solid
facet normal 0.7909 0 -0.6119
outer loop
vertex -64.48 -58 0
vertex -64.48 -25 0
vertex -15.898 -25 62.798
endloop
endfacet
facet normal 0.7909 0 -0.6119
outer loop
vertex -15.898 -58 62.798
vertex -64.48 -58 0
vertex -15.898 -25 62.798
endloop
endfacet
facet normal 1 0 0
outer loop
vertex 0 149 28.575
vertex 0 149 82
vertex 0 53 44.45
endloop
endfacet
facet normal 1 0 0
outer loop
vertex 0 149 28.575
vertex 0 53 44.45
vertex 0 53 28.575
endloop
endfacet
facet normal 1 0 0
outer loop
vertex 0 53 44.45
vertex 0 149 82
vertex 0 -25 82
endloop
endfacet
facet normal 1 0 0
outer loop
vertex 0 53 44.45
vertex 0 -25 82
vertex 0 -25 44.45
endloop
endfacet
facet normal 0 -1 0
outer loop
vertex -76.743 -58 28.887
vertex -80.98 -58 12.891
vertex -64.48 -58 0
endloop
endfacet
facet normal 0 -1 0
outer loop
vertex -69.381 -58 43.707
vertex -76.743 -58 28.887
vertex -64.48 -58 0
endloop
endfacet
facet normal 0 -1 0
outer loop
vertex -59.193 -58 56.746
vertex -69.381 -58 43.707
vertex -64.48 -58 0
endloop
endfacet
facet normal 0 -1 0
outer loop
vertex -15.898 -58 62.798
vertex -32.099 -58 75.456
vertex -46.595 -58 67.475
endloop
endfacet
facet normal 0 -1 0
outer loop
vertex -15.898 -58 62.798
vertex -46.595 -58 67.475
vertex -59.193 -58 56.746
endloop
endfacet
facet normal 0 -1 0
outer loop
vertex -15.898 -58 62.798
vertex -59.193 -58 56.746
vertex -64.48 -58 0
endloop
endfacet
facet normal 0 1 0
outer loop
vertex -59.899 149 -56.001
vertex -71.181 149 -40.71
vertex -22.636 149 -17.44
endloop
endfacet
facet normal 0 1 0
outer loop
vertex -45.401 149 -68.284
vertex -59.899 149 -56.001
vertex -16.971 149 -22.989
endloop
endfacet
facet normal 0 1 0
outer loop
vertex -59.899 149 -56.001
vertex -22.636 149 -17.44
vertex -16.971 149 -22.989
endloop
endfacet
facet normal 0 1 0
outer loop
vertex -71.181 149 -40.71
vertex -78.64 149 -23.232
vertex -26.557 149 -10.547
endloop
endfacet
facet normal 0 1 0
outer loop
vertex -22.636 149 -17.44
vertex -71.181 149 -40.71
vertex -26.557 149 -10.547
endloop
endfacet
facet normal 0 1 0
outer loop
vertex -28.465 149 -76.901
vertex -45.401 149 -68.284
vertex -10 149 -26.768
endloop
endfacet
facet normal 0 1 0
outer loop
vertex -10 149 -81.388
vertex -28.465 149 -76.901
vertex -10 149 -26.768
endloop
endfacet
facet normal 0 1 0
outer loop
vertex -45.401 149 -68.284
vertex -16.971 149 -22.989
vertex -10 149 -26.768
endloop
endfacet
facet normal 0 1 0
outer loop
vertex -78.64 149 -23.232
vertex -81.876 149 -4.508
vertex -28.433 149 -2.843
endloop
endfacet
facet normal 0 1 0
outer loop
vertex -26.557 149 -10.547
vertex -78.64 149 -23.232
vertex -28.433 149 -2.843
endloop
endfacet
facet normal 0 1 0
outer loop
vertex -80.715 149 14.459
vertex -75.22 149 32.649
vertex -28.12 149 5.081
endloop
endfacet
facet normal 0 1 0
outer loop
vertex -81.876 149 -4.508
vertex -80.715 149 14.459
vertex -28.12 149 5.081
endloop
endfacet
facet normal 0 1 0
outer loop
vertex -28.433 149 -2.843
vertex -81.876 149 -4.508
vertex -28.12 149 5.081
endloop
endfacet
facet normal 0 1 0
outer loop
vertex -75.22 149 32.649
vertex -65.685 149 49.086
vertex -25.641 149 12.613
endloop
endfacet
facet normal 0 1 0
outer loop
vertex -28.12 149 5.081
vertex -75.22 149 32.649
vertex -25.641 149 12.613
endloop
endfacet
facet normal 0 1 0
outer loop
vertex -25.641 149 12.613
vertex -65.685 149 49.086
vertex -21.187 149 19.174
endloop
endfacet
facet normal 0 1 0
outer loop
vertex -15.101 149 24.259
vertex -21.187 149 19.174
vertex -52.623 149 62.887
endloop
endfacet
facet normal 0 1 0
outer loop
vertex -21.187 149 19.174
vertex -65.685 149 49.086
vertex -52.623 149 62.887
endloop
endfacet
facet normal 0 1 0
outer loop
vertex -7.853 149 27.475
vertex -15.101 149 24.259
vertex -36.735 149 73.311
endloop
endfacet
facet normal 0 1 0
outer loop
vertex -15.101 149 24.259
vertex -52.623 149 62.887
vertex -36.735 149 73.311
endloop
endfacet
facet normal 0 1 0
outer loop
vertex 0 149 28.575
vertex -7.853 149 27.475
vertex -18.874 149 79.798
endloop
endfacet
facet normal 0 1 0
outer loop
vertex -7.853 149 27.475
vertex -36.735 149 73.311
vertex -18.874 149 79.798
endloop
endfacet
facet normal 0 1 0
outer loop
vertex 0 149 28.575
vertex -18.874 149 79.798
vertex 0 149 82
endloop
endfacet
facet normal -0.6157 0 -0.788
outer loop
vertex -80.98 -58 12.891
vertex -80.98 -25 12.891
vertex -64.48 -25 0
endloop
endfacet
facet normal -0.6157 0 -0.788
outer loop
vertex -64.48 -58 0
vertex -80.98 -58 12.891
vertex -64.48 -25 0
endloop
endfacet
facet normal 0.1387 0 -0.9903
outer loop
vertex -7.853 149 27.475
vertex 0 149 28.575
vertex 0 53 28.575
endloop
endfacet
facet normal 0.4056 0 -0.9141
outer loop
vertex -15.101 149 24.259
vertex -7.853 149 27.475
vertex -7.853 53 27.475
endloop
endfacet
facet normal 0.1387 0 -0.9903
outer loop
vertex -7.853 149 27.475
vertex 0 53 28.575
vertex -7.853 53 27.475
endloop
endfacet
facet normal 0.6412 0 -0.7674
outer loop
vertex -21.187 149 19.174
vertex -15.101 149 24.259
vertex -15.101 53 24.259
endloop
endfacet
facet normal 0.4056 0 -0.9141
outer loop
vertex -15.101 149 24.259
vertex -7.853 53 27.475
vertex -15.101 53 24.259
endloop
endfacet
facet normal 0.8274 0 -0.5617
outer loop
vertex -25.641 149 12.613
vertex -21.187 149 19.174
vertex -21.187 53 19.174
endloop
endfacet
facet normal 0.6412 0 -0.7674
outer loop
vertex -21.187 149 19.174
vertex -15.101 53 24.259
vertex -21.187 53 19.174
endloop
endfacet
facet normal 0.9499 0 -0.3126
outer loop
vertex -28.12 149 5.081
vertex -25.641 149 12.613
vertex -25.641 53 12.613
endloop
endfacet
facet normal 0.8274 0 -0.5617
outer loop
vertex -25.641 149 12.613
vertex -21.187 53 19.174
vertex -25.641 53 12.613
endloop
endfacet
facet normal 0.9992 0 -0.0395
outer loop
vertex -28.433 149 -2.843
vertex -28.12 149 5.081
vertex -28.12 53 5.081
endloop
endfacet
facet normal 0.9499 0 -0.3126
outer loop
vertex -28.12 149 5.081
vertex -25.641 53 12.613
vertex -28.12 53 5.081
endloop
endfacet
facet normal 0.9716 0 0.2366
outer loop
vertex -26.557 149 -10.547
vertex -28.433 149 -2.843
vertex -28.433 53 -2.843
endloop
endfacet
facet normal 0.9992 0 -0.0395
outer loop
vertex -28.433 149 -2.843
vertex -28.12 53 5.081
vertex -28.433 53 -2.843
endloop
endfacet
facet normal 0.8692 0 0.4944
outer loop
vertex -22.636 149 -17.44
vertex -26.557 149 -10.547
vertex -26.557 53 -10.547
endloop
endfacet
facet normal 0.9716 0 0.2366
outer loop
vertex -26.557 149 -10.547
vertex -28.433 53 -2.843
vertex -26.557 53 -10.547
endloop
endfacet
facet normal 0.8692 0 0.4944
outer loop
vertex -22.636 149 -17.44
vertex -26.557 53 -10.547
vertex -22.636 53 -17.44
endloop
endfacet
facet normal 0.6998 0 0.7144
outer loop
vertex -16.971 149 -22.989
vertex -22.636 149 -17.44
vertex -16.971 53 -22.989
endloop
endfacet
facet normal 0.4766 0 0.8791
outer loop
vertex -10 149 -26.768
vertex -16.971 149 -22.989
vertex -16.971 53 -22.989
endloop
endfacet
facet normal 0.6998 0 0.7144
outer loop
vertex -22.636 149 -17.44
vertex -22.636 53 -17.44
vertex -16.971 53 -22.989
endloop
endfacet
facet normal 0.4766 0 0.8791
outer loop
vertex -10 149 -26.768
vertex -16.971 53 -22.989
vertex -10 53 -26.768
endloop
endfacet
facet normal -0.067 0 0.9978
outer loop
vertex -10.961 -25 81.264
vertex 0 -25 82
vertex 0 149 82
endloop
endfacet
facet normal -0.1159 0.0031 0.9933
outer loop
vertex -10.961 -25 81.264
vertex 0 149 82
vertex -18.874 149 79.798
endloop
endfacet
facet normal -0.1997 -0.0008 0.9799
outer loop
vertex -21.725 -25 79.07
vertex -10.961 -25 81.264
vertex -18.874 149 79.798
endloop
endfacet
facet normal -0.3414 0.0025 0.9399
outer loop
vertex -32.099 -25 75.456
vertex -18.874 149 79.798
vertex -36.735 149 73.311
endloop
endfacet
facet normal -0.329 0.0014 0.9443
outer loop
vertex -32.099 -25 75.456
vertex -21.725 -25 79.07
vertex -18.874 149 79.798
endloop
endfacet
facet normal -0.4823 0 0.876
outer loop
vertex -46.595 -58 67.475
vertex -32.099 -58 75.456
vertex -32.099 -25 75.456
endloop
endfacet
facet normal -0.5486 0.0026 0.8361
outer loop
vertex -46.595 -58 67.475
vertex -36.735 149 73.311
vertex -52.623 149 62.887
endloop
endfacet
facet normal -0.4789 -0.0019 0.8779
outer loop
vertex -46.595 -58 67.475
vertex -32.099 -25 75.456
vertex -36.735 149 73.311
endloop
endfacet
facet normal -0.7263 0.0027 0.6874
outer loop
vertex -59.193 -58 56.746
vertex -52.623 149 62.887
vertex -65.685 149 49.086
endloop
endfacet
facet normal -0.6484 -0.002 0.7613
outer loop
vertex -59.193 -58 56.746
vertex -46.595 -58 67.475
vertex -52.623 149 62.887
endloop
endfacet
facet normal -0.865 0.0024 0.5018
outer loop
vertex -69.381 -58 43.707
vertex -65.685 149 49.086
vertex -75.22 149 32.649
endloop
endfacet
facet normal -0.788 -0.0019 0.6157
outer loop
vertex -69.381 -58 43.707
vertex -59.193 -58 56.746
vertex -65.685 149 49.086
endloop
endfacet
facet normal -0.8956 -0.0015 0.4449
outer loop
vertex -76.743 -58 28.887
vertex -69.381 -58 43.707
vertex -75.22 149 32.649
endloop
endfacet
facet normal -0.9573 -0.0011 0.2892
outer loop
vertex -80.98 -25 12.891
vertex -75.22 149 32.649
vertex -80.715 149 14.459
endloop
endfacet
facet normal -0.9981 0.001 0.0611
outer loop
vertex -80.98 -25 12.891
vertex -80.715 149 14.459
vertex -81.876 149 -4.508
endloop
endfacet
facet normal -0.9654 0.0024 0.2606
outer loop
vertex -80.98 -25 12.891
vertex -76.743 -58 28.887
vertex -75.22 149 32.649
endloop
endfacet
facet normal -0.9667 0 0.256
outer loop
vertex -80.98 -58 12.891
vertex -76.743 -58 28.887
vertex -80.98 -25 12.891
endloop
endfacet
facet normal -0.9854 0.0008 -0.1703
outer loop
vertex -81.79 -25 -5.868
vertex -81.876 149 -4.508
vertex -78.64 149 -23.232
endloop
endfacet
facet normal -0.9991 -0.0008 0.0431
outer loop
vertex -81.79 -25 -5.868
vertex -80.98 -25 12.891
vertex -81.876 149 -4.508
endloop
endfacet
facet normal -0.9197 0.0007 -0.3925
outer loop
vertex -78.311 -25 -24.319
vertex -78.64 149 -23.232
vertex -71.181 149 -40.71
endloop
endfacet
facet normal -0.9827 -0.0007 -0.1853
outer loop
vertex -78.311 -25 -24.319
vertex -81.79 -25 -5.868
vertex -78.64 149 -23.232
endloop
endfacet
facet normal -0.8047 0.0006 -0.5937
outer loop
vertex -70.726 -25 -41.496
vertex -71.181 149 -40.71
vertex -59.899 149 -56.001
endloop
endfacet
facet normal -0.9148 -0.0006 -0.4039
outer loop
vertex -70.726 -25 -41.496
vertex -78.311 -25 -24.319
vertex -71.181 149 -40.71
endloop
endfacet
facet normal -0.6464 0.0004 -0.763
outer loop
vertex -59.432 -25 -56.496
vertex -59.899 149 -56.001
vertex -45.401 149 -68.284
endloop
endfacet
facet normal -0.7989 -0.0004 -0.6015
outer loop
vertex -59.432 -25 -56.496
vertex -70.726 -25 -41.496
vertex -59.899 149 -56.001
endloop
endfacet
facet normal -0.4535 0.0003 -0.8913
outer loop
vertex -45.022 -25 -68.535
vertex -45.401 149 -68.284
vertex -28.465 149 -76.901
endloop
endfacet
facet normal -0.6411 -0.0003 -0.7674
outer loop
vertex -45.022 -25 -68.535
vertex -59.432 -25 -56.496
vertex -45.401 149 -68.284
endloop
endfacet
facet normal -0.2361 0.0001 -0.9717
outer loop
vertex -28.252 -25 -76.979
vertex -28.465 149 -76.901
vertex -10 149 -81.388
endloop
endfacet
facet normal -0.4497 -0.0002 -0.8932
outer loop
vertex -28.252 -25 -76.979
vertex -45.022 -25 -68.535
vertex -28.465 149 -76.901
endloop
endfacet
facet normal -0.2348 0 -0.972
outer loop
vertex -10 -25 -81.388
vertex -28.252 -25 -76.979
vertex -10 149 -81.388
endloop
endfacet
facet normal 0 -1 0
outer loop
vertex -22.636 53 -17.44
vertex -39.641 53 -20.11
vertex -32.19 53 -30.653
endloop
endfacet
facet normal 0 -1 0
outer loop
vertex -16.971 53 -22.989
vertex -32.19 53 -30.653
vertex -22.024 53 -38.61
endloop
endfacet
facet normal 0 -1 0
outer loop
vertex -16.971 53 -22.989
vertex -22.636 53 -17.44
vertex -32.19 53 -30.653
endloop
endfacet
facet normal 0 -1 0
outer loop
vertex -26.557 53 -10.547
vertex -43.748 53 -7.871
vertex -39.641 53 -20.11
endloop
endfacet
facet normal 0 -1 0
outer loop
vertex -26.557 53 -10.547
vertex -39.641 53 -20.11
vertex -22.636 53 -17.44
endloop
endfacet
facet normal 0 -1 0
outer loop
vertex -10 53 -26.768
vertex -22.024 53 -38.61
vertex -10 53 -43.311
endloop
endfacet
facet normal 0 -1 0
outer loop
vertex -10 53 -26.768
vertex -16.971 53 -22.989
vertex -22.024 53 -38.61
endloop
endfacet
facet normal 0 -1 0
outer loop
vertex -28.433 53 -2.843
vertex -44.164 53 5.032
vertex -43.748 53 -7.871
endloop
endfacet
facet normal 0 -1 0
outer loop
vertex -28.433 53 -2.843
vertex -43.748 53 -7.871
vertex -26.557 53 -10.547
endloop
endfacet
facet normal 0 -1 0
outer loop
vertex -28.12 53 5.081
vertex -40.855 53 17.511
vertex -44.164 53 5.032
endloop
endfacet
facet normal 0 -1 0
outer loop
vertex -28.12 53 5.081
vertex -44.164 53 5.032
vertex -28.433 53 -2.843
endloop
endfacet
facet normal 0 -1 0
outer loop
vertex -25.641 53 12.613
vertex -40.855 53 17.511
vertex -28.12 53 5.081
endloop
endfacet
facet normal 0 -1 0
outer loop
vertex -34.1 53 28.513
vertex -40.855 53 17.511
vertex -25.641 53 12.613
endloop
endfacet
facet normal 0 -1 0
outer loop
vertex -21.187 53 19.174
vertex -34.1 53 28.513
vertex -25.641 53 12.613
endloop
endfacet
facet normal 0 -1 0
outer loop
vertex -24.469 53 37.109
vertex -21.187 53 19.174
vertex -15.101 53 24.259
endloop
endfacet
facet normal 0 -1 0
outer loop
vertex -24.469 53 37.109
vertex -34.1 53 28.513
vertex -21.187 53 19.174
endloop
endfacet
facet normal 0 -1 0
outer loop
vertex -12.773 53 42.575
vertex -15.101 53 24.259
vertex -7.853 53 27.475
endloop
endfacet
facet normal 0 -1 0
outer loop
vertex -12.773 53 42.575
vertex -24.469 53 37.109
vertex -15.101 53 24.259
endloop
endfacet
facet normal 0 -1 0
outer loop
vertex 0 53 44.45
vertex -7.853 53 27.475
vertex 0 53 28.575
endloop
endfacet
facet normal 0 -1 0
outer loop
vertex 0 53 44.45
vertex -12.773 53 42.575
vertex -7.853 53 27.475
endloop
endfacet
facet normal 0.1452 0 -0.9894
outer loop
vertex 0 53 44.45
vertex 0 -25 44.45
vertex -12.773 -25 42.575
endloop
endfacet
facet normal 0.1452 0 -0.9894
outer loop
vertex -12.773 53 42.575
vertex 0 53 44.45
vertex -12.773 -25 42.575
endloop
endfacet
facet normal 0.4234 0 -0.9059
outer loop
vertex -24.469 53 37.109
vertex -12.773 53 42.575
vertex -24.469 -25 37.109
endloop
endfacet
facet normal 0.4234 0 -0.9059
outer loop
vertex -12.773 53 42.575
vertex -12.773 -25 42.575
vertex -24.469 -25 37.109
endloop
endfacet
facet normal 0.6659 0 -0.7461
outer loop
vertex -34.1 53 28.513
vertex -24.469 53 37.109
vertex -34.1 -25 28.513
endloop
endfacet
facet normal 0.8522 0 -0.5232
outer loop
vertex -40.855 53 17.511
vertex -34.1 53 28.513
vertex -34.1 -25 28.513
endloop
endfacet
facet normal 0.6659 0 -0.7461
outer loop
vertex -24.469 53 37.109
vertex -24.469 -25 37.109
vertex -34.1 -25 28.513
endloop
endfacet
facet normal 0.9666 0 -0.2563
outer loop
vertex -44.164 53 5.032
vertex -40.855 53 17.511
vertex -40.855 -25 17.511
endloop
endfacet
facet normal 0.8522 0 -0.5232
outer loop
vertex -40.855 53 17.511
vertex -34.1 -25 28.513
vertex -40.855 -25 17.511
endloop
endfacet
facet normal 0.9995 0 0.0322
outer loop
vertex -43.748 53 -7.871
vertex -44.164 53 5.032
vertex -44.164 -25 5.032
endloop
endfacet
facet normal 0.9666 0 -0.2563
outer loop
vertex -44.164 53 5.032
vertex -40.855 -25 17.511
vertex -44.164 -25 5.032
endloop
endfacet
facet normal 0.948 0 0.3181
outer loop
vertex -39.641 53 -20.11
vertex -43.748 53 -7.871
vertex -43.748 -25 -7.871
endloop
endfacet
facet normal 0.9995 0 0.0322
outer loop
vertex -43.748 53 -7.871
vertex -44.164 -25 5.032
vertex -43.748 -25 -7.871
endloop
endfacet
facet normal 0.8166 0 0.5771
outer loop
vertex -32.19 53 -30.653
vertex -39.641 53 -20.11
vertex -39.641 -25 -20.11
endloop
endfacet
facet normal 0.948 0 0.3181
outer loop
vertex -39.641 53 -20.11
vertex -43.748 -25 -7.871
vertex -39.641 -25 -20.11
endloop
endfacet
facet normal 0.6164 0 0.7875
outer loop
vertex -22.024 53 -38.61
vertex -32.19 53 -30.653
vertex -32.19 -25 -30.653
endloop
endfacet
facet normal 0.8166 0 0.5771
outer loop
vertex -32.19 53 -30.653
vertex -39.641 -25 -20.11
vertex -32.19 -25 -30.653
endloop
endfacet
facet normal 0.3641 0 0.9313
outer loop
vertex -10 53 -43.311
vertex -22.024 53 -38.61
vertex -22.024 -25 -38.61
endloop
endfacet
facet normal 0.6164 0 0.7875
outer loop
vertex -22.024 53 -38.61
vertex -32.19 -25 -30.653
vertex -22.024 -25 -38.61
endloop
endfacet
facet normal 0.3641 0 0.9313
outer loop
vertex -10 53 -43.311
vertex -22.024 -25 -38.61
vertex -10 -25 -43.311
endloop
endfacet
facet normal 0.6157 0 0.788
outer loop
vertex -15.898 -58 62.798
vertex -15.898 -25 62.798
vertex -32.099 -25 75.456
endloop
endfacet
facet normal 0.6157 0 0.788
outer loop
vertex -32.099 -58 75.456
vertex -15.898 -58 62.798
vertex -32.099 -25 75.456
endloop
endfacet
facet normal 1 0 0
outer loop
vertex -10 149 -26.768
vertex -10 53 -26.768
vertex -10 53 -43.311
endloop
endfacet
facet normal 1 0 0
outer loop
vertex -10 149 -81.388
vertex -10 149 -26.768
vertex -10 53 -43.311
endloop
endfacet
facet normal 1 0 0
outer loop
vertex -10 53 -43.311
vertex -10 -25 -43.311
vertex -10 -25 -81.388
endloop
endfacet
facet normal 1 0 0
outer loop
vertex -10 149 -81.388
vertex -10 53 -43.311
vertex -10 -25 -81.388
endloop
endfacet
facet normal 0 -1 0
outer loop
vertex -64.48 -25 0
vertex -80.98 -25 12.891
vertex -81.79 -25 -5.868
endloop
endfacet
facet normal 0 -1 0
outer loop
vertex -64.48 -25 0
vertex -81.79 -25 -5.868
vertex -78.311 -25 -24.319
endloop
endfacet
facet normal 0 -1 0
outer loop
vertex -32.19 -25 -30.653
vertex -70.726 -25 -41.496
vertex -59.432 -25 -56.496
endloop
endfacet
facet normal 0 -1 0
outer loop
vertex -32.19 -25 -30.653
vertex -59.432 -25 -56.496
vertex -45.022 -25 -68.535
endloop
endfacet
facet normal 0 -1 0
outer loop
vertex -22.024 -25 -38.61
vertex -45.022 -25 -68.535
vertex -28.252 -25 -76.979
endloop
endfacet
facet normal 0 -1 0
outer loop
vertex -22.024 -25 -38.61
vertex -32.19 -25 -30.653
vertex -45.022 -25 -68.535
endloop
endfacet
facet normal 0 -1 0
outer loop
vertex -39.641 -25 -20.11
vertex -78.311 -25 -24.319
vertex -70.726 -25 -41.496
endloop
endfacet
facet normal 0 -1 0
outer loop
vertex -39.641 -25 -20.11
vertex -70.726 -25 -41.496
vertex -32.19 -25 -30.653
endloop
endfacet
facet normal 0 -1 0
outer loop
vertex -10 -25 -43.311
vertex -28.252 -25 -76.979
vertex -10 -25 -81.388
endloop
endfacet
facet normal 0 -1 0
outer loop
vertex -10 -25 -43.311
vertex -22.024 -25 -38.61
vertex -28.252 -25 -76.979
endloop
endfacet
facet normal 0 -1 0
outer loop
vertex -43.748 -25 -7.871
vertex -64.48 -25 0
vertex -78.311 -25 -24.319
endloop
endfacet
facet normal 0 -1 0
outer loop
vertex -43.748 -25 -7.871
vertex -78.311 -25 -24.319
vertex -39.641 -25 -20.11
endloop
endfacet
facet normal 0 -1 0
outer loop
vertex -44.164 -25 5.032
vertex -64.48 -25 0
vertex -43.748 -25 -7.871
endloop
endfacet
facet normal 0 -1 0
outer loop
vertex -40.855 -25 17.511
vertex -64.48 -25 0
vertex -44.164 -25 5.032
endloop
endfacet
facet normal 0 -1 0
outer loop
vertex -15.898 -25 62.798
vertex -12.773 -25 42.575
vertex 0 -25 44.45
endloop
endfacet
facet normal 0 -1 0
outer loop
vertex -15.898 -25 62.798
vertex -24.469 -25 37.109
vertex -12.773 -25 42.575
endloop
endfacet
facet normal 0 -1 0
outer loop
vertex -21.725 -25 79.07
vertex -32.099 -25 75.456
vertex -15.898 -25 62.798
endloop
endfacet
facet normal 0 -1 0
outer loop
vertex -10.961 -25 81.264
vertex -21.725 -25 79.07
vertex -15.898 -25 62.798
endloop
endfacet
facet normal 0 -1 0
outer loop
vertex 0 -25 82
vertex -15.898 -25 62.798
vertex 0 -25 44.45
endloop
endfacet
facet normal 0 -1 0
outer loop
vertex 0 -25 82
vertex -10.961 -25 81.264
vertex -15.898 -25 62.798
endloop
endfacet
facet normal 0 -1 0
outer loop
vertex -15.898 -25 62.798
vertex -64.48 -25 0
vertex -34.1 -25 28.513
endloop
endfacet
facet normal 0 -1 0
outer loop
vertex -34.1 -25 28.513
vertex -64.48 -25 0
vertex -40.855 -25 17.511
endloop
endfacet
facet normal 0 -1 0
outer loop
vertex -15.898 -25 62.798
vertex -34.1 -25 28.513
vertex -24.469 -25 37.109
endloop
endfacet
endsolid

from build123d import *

# Parameters (mm, degrees)
F0_R          = 82
F1_DEPTH      = 25
F1_DEPTH_BACK = 149
F2_R          = 28.575
F3_DEPTH      = 174.001
F6_DEPTH      = 33
F7_R          = 44.45
F7_R_2        = 28.575
F8_DEPTH      = 78
F10_DEPTH     = 174.001


with BuildPart() as f1:
    # F0 (on Front) → F1 (new body, two sides)
    with BuildSketch(Plane.XZ) as f1_sk:
        Circle(F0_R)
    extrude(amount=F1_DEPTH)
    extrude(f1_sk.sketch, amount=-F1_DEPTH_BACK)

    # F2 (on face) → F3 (cut, through all)
    with BuildSketch(Plane.XZ.offset(25)):
        Circle(F2_R)
    extrude(amount=-F3_DEPTH, mode=Mode.SUBTRACT)

    # F4 (on face) → F6 (join)
    with BuildSketch(Plane.XZ.offset(25)):
        with BuildLine():
            ThreePointArc((-32.0991935027, 75.4562242395), (-64.6168817958, 50.4842409767), (-80.9803496399, 12.8911974698))
            Line((-80.9803496399, 12.8911974698), (-64.4803693095, 0))
            Line((-64.4803693095, 0), (-15.8976419198, 62.7981848607))
            Line((-15.8976419198, 62.7981848607), (-32.0991935027, 75.4562242395))
        make_face()
    extrude(amount=F6_DEPTH)

    # F7 (on face) → F8 (cut)
    with BuildSketch(Plane.XZ.offset(25)):
        Circle(F7_R)
        Circle(F7_R_2, mode=Mode.SUBTRACT)
    extrude(amount=-F8_DEPTH, mode=Mode.SUBTRACT)

    # F9 (on face) → F10 (cut, through all)
    with BuildSketch(Plane.XZ.offset(25)):
        with BuildLine():
            Line((91, 95.2523052692), (0, 95.2523052692))
            Line((0, 95.2523052692), (0, 82))
            ThreePointArc((0, 82), (57.9827560573, 57.9827560573), (82, 0))
            ThreePointArc((82, 0), (54.3323108288, -61.4166101311), (-10, -81.3879597975))
            Line((-10, -81.3879597975), (-10, -94.1154360771))
            Line((-10, -94.1154360771), (91, -94.1154360771))
            Line((91, -94.1154360771), (91, 95.2523052692))
        make_face()
        with BuildLine():
            ThreePointArc((82, 0), (57.9827560573, 57.9827560573), (0, 82))
            Line((0, 82), (0, 28.575))
            ThreePointArc((0, 28.575), (20.2055762724, 20.2055762724), (28.575, 0))
            ThreePointArc((28.575, 0), (16.2908045381, -23.4763777551), (-10, -26.7680896778))
            Line((-10, -26.7680896778), (-10, -81.3879597975))
            ThreePointArc((-10, -81.3879597975), (54.3323108288, -61.4166101311), (82, 0))
        make_face()
    extrude(amount=-F10_DEPTH, mode=Mode.SUBTRACT)


solid = f1.part
